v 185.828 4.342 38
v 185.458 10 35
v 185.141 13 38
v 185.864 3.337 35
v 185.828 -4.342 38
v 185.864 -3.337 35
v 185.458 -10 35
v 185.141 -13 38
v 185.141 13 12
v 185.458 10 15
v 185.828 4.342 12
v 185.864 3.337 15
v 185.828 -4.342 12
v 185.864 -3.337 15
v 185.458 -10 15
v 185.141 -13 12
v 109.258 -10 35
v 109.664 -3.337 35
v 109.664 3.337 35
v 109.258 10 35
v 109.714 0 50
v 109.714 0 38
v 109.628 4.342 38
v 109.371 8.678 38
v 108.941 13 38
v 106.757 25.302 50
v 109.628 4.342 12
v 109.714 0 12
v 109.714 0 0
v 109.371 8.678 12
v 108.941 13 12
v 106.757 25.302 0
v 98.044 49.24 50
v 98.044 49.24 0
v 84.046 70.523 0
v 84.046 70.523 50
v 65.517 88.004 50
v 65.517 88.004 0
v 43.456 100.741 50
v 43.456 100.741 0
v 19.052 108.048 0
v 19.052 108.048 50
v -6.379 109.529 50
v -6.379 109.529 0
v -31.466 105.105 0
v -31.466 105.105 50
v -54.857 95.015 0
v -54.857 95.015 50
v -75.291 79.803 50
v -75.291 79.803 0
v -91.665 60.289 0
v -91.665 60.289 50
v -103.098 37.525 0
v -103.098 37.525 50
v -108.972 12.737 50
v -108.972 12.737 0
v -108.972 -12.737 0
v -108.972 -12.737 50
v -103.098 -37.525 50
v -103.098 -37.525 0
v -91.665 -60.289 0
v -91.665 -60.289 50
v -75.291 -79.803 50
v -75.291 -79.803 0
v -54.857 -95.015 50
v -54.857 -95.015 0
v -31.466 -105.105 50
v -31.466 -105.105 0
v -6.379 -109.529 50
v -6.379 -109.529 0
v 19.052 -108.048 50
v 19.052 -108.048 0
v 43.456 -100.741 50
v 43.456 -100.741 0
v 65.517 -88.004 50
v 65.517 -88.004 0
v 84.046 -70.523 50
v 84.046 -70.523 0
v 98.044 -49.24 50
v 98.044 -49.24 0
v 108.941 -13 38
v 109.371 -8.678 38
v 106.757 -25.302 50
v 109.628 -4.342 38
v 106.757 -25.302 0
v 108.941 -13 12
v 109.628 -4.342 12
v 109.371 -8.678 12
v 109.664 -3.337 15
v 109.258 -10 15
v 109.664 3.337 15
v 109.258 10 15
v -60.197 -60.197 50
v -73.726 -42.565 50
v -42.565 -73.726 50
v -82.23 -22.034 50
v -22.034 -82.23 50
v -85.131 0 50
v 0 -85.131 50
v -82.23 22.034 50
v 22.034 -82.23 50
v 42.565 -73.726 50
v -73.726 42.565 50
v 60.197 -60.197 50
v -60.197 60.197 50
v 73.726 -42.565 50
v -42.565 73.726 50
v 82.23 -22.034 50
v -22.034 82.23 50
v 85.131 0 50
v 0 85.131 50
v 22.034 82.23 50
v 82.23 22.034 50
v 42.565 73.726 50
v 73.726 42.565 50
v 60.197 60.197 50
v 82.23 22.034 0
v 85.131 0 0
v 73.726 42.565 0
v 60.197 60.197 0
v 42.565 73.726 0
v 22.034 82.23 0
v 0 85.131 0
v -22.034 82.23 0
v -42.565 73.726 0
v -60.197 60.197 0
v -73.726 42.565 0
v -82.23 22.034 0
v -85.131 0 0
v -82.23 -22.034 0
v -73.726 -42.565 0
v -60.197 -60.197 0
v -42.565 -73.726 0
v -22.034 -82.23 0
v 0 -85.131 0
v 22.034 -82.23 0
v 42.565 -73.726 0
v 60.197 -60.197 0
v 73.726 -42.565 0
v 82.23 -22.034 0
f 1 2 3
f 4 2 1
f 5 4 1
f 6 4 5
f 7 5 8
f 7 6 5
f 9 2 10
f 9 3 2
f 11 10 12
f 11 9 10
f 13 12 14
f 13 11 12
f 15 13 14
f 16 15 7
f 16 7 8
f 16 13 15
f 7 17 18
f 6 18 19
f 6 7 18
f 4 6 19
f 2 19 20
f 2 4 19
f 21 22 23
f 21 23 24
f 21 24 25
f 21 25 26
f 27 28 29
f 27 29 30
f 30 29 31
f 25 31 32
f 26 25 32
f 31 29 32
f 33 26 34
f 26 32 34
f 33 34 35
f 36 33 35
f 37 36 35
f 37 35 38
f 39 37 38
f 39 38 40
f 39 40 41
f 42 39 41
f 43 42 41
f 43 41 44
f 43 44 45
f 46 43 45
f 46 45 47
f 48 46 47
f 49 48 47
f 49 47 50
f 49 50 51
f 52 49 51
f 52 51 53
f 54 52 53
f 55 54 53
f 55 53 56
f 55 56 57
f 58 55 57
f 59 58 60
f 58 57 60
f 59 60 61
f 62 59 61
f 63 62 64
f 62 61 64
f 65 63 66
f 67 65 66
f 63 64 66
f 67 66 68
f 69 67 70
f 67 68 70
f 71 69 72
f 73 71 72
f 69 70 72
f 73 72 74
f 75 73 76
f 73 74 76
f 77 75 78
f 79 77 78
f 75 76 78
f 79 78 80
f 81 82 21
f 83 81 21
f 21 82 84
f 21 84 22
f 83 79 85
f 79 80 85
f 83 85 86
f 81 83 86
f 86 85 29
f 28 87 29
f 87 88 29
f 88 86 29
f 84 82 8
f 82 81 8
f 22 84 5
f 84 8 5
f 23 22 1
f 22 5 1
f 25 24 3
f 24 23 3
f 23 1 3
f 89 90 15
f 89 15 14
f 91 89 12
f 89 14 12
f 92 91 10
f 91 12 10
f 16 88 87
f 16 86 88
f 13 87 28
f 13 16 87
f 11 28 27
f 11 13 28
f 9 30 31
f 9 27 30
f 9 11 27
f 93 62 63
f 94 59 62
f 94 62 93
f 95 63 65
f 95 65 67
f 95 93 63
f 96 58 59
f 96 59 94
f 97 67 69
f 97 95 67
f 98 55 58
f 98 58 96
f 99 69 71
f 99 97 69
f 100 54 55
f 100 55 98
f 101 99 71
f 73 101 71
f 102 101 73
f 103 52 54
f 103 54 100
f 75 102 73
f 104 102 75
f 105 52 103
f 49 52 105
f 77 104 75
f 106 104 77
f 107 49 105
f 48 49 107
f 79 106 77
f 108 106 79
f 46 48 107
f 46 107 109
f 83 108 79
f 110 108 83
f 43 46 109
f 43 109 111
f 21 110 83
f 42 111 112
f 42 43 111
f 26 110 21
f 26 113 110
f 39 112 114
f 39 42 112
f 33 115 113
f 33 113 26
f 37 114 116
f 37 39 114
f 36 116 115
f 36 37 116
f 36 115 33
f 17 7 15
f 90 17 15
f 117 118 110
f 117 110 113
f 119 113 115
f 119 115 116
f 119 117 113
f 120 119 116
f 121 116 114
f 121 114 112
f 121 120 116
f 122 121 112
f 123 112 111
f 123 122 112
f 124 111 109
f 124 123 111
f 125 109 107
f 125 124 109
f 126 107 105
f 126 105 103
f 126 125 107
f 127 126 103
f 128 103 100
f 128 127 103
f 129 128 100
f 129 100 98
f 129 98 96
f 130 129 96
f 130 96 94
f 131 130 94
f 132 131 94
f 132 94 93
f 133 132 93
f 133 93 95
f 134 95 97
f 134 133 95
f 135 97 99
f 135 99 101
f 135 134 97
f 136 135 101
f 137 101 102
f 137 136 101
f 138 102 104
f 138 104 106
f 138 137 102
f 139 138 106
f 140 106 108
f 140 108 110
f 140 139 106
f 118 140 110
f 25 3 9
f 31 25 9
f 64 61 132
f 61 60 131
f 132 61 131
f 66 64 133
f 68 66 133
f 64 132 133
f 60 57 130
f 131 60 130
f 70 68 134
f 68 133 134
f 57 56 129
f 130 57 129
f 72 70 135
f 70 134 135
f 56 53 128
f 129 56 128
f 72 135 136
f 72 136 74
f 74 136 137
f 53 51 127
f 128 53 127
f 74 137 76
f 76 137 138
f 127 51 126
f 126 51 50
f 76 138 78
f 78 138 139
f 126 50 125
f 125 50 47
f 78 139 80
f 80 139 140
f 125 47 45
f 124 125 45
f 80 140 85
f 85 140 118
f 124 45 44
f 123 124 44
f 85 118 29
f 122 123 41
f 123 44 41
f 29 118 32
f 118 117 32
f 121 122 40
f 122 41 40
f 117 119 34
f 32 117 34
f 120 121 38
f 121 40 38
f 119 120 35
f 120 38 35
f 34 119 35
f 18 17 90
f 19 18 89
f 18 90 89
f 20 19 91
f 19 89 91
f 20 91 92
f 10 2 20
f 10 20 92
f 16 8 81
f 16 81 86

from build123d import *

# Parameters (mm, degrees)
SKETCH1_R                  = 109.714317711
SKETCH1_R_2                = 85.130943159
BOSS_EXTRUDE1_DEPTH        = 50
BOSS_EXTRUDE2_REACH        = 241.217
BOSS_EXTRUDE2_START_RADIUS = 109.714317711
BOSS_EXTRUDE2_END_RADIUS   = 109.714317711
SKETCH2_W                  = 26
SKETCH2_H                  = 26
SKETCH2_W_2                = 20
SKETCH2_H_2                = 20


with BuildPart() as part:
    # Sketch1 → Boss-Extrude1 (new body)
    with BuildSketch(Plane.XY):
        Circle(SKETCH1_R)
        Circle(SKETCH1_R_2, mode=Mode.SUBTRACT)
    extrude(amount=BOSS_EXTRUDE1_DEPTH)

    # Boss-Extrude2: from a cylinder face, 241.217 long prism both ways, kept between that surface and its translate by the depth
    boss_extrude2_start = Plane(origin=(0, 0, 25), z_dir=(0, 0, -1)) * Cylinder(BOSS_EXTRUDE2_START_RADIUS, 702.862635421, mode=Mode.PRIVATE)
    boss_extrude2_end = Plane(origin=(76.2, 0, 25), z_dir=(0, 0, -1)) * Cylinder(BOSS_EXTRUDE2_END_RADIUS, 702.862635421, mode=Mode.PRIVATE)
    # Sketch2 → Boss-Extrude2 (add, from a surface)
    with BuildSketch(Plane(origin=(0, 0, 0), x_dir=(0, 0, -1), z_dir=(1, 0, 0)), mode=Mode.PRIVATE) as boss_extrude2_sk1:
        with Locations((-25, 0)):
            Rectangle(SKETCH2_W, SKETCH2_H)
        with Locations((-25, 0)):
            Rectangle(SKETCH2_W_2, SKETCH2_H_2, mode=Mode.SUBTRACT)
    boss_extrude2_tool1 = extrude(boss_extrude2_sk1.sketch, amount=BOSS_EXTRUDE2_REACH, both=True, mode=Mode.PRIVATE)
    add(((boss_extrude2_tool1 - boss_extrude2_start) & boss_extrude2_end).solids().sort_by_distance((147.199526, 12.632304, 25))[0])


solid = part.part
